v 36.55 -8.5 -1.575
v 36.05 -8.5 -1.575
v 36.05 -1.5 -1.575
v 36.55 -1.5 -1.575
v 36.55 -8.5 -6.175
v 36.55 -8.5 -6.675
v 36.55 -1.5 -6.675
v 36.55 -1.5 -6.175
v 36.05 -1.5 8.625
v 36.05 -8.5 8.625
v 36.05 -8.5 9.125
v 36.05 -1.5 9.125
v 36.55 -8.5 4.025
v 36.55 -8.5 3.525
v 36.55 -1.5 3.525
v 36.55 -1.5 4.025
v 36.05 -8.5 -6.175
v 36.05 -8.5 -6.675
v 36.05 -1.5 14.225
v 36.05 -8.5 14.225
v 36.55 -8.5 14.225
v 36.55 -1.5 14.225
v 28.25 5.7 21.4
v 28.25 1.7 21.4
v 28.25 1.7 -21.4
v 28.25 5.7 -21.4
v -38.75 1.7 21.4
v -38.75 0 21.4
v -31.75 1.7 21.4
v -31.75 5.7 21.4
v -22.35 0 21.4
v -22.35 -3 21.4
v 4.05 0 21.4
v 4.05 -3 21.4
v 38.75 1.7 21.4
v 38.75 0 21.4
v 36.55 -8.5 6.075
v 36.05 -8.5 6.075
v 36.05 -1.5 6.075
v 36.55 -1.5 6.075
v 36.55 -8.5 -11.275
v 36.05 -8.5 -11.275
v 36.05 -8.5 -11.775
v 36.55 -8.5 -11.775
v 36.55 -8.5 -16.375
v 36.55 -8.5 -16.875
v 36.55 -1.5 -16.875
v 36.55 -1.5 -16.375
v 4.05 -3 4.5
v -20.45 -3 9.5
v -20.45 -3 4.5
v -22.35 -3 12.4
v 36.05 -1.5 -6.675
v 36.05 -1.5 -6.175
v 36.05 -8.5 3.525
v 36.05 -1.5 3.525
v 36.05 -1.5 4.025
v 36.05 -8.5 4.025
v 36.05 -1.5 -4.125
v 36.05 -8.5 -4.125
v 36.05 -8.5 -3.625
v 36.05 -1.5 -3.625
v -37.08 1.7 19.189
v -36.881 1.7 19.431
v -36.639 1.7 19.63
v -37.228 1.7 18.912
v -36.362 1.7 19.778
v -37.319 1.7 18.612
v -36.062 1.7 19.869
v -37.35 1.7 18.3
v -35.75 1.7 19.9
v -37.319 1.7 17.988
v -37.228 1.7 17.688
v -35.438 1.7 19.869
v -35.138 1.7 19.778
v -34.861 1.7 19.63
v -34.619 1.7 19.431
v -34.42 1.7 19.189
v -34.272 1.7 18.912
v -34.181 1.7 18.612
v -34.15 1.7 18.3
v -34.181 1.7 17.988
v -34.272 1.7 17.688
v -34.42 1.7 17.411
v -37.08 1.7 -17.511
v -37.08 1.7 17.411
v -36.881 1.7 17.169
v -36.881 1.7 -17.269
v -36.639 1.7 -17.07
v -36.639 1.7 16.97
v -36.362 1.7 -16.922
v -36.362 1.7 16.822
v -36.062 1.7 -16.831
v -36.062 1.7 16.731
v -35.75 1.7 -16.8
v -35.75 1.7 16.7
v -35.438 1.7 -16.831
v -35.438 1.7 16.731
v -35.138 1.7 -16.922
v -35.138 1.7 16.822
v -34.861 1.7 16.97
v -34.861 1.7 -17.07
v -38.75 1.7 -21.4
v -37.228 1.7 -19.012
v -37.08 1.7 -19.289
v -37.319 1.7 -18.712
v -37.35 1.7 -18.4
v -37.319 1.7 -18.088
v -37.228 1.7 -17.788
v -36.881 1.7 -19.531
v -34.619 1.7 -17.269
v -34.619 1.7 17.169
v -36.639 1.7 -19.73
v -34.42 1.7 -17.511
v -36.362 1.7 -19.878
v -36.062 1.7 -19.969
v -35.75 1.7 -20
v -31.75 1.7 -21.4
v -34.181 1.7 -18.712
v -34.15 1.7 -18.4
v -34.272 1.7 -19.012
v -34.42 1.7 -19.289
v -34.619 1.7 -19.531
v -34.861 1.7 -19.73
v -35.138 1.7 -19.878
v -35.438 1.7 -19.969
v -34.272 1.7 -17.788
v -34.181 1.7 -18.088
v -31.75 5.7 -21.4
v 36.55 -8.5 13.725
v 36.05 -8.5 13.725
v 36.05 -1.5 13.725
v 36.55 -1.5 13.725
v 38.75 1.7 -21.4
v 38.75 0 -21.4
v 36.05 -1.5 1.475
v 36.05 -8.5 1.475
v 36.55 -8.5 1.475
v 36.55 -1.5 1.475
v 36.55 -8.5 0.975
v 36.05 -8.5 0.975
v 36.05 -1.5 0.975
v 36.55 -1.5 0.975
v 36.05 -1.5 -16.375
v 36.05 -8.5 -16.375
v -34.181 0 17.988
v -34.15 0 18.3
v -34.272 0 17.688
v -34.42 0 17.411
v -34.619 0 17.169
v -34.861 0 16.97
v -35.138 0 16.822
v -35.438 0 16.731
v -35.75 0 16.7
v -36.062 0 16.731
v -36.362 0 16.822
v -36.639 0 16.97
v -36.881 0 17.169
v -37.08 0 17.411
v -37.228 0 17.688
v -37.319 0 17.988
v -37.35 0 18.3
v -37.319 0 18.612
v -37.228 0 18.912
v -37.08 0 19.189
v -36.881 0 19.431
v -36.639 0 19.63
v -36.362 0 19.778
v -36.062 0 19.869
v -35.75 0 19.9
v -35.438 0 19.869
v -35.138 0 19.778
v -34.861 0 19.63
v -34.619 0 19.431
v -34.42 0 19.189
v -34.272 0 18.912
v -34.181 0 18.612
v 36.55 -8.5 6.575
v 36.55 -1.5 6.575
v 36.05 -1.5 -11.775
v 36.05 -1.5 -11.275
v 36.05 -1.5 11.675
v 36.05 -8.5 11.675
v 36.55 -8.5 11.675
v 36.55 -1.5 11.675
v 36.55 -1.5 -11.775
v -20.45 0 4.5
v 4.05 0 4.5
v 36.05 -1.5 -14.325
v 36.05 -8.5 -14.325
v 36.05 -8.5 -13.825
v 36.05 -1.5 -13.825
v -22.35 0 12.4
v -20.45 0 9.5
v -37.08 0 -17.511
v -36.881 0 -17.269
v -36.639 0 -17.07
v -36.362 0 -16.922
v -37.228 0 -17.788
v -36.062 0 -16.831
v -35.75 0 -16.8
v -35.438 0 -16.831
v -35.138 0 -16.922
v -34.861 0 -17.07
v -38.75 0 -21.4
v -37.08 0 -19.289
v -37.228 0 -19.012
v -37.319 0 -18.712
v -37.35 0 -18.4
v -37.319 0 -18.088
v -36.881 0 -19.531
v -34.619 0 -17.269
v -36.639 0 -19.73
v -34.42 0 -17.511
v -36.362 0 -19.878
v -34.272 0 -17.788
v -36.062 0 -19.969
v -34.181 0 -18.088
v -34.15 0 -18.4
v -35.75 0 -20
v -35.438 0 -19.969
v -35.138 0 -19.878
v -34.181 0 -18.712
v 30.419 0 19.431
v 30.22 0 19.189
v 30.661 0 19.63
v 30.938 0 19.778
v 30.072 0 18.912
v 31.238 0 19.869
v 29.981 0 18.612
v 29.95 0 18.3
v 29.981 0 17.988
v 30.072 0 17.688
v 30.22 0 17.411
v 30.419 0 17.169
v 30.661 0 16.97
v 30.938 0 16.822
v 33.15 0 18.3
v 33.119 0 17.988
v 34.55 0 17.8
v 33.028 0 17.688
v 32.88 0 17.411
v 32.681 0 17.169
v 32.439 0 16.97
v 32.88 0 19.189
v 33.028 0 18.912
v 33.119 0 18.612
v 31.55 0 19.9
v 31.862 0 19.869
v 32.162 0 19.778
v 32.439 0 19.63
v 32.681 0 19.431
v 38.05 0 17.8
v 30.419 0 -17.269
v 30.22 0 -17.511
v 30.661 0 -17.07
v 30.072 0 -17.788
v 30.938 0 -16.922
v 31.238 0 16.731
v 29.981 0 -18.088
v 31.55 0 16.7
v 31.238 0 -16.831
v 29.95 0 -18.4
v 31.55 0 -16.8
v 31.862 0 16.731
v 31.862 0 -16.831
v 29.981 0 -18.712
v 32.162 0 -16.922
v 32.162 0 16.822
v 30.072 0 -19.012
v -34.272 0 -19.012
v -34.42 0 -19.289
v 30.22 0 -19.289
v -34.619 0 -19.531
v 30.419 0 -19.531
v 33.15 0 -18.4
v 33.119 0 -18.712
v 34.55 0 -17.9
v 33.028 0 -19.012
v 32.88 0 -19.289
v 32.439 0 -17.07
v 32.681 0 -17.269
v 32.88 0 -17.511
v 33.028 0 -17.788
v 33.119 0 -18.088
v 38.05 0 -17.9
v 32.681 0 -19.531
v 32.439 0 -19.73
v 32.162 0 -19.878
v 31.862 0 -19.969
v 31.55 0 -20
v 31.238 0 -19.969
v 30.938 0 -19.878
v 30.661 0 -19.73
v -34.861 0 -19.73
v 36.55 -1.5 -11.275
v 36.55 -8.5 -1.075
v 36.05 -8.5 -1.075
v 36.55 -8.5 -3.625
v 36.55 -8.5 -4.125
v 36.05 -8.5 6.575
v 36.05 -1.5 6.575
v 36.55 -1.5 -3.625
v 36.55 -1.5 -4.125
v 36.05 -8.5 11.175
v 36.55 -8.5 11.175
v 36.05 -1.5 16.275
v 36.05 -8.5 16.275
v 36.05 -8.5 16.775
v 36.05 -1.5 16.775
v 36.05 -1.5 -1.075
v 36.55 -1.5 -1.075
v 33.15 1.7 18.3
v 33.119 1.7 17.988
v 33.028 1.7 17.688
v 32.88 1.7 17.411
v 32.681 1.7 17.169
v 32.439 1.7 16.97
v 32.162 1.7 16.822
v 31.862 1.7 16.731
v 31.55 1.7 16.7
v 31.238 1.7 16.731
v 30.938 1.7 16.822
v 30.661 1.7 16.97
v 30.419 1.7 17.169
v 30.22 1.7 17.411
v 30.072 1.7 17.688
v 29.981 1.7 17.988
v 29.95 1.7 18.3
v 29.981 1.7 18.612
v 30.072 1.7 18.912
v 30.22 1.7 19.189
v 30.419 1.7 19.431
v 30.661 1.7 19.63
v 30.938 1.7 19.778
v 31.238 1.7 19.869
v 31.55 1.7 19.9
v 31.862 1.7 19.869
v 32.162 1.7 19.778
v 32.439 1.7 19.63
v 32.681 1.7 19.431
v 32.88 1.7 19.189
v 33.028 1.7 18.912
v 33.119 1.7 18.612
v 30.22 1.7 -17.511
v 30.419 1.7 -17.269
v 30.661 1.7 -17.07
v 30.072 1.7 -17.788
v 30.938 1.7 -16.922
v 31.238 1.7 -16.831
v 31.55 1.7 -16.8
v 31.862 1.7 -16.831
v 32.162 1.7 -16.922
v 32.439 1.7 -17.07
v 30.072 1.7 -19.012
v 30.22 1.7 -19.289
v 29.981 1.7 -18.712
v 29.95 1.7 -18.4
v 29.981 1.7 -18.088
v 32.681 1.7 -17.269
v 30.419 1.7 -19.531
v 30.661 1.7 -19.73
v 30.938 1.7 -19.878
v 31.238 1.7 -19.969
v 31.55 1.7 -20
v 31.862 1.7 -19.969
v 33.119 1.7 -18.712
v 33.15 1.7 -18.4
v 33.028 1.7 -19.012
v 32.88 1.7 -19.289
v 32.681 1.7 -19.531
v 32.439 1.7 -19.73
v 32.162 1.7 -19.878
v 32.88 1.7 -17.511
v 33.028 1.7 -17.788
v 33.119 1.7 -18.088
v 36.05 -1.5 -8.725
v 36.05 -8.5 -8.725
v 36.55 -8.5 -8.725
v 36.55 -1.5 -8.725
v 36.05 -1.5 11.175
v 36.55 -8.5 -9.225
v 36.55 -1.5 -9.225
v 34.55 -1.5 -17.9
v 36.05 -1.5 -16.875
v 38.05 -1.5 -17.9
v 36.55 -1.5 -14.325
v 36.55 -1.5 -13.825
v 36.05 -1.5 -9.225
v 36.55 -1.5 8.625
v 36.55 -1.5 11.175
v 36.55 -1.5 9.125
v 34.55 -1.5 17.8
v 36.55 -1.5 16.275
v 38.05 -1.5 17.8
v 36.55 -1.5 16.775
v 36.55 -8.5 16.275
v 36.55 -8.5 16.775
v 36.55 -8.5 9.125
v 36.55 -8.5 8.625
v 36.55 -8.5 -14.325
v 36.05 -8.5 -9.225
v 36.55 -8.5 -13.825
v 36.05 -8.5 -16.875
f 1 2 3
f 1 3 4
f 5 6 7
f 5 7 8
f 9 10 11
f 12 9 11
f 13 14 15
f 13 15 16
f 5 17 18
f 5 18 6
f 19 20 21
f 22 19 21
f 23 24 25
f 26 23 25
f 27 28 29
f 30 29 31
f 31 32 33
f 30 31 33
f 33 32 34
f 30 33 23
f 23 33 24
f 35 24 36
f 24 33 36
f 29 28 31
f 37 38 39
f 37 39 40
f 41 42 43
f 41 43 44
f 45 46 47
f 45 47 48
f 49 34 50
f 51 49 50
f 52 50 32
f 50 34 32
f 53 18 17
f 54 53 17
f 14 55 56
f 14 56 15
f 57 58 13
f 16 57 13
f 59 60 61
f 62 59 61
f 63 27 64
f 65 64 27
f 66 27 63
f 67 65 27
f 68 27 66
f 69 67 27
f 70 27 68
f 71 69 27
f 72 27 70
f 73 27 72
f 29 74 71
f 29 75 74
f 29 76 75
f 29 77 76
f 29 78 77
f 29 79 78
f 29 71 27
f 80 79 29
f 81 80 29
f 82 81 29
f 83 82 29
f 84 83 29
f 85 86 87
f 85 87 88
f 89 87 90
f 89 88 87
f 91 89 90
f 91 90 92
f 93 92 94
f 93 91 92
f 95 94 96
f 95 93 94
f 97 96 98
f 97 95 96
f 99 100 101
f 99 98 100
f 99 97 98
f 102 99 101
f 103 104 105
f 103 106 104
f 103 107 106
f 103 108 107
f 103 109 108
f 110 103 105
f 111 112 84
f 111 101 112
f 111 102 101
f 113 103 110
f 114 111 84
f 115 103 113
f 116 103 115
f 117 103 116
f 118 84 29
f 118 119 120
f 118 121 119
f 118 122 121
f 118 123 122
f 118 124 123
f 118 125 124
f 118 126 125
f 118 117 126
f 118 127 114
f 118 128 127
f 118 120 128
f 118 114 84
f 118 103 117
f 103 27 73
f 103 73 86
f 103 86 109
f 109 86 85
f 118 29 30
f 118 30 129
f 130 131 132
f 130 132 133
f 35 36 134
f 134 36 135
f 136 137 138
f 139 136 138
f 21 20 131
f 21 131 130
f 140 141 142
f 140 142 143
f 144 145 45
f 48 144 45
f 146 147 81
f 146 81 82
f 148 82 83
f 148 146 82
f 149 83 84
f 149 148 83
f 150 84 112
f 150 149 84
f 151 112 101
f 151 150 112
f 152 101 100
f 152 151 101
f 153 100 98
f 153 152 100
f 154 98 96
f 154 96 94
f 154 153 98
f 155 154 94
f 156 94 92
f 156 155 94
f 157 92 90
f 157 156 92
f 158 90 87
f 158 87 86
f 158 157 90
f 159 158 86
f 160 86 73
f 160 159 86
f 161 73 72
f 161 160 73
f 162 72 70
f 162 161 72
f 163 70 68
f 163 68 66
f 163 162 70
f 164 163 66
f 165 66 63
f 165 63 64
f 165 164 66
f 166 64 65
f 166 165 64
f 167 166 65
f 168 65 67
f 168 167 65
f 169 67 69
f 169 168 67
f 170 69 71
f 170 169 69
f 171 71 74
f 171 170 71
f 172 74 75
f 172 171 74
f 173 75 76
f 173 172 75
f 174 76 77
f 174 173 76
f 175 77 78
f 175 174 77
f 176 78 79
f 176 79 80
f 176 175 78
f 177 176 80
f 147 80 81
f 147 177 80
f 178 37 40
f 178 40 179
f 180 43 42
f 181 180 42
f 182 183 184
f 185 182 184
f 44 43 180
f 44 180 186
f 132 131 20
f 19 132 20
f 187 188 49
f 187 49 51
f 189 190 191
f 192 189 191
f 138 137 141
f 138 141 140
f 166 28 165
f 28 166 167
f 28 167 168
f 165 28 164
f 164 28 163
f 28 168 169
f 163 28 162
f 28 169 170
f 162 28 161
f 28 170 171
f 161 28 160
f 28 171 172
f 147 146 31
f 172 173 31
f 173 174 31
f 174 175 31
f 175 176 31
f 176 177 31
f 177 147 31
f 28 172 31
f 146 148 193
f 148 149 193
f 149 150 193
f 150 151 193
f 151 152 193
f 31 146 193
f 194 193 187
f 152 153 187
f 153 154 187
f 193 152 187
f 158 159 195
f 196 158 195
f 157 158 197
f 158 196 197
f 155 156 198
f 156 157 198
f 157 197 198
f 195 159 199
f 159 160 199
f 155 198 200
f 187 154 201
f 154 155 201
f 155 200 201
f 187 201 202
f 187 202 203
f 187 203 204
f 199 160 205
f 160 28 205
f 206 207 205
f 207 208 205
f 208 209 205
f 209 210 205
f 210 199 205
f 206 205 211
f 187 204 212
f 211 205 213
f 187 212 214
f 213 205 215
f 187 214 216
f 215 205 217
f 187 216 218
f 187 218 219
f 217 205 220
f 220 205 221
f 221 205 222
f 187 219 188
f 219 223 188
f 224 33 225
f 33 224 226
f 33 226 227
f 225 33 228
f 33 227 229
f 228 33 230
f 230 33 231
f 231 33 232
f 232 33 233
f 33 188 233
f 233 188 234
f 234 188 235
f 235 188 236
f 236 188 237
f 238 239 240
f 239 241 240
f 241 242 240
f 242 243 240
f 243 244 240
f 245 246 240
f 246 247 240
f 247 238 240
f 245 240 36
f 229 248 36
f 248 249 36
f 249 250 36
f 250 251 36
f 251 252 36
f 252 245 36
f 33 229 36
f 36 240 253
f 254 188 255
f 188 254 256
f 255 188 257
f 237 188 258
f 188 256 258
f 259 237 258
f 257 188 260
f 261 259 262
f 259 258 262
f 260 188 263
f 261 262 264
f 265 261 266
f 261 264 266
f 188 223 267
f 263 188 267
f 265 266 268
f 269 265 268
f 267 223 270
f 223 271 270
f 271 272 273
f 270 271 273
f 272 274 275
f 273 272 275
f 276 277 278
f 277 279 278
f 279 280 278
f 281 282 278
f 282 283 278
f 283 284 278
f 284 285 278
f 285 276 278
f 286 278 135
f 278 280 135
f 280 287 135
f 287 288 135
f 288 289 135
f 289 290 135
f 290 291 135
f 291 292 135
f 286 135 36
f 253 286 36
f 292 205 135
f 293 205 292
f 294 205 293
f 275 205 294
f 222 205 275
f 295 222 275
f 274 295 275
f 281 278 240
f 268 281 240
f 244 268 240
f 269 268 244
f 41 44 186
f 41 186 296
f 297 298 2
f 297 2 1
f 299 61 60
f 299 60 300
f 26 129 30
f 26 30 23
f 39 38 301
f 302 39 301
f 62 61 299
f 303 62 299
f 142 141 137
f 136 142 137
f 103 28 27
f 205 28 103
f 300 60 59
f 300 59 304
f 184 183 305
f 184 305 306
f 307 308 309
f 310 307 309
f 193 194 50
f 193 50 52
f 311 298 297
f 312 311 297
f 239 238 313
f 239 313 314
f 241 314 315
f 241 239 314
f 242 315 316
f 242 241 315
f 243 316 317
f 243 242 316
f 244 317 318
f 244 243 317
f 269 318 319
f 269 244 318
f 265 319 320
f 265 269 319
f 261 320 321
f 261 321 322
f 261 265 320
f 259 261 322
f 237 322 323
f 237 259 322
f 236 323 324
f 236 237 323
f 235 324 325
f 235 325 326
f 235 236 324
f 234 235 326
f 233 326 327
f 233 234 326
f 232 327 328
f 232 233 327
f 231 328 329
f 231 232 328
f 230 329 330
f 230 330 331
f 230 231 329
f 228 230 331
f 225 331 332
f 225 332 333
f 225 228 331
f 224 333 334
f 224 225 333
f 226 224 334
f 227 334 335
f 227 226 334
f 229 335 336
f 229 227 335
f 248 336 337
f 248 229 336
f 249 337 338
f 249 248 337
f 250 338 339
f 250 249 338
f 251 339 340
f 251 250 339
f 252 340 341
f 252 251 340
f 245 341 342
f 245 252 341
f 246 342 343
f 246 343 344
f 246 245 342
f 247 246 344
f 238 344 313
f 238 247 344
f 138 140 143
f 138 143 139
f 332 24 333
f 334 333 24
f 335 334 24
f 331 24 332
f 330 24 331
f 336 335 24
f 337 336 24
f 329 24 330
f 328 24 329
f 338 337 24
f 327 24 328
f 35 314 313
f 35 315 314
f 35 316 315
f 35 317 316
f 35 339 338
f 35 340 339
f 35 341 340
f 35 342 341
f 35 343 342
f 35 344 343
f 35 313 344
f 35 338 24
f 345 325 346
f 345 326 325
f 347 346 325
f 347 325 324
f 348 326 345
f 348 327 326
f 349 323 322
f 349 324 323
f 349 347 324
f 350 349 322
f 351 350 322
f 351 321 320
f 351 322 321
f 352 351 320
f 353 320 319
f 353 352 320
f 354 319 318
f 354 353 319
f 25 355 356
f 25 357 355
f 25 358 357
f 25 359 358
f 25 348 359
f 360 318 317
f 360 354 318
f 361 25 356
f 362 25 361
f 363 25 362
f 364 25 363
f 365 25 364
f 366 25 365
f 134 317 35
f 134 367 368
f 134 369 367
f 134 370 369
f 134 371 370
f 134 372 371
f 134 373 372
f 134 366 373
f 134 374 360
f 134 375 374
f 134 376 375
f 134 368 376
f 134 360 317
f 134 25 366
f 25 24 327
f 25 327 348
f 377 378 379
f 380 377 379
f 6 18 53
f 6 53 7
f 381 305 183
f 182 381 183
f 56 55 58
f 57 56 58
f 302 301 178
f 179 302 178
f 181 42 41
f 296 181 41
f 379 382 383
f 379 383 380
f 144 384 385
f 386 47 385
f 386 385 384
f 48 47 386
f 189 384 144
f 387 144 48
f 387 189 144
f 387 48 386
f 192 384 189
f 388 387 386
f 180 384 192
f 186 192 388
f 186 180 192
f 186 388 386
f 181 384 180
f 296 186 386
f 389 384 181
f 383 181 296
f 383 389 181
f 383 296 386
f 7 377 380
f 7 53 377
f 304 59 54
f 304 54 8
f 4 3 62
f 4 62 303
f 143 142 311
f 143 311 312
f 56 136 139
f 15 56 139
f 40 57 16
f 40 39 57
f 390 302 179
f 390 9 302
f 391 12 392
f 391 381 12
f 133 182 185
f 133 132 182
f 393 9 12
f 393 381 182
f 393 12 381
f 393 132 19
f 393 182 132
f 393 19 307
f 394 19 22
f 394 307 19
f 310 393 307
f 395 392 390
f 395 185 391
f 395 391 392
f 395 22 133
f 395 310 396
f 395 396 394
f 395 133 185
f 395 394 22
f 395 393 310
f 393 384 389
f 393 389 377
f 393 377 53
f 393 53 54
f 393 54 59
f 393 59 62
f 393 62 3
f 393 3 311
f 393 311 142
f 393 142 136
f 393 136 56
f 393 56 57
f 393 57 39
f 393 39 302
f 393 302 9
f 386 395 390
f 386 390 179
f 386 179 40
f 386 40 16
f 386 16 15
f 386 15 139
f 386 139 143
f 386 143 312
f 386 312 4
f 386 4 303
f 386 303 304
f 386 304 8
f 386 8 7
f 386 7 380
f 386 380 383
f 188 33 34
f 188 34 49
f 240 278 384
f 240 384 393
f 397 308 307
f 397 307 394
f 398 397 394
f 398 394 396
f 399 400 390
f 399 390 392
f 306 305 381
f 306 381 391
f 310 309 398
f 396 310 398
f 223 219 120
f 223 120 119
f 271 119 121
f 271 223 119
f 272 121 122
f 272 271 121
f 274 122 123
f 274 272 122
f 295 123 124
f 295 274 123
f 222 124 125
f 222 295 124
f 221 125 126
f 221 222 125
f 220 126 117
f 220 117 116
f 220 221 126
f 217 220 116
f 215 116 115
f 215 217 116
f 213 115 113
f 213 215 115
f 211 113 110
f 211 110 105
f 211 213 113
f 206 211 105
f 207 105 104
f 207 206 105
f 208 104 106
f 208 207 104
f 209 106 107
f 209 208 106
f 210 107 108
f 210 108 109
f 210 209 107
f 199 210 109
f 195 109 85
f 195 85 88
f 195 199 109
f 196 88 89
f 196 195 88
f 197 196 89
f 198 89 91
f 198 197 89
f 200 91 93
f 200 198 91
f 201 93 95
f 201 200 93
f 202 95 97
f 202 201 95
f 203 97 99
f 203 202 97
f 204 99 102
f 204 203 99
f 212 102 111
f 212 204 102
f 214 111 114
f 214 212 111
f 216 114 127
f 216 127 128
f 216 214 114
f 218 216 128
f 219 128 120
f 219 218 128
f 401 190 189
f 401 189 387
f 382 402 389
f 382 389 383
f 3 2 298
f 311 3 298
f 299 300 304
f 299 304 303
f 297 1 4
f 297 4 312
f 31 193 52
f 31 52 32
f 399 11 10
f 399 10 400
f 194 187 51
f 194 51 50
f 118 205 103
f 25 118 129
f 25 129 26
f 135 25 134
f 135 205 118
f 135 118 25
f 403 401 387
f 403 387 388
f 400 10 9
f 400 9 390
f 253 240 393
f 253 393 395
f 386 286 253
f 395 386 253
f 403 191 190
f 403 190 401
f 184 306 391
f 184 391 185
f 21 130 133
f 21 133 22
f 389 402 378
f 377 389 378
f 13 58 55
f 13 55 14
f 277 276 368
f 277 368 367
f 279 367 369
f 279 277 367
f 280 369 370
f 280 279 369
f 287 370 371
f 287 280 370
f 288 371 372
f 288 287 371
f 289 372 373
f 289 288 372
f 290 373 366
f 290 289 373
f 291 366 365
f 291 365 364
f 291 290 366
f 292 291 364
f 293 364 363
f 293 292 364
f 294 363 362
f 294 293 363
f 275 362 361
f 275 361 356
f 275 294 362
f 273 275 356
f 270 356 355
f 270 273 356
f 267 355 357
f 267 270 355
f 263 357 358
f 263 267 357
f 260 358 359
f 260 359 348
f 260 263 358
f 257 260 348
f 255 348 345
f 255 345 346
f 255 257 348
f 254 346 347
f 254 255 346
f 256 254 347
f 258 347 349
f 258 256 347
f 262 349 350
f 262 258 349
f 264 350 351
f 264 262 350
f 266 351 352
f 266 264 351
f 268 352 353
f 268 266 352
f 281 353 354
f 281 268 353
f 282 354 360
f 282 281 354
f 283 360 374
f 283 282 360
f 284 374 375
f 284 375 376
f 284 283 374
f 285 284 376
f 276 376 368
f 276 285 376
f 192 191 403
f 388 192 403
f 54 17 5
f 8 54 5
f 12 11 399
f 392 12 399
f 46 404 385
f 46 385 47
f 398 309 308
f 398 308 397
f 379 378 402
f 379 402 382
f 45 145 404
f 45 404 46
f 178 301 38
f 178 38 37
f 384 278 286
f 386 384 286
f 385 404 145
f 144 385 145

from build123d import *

# Parameters (mm, degrees)
SZKIC1_W                    = 77.5
SZKIC1_H                    = 42.8
SZKIC1_R                    = 1.6
DODANIE_WYCI_GNI_CIE1_DEPTH = 1.7
SZKIC2_W                    = 60
SZKIC2_H                    = 42.8
DODANIE_WYCI_GNI_CIE2_DEPTH = 4
DODANIE_WYCI_GNI_CIE3_DEPTH = 3
SZKIC4_W                    = 3.5
SZKIC4_H                    = 35.7
DODANIE_WYCI_GNI_CIE4_DEPTH = 8.5
SZKIC5_W                    = 20.589223083
SZKIC5_H                    = 59.264583933
SZKIC5_W_2                  = 0.5
SZKIC5_H_2                  = 0.5
WYTNIJ_WYCI_GNI_CIE1_DEPTH  = 7


with BuildPart() as part:
    # Szkic1 → Dodanie-wyciągnięcie1 (new body)
    with BuildSketch(Plane(origin=(0, 0, 0), x_dir=(1, 0, 0), z_dir=(0, 1, 0))):
        Rectangle(SZKIC1_W, SZKIC1_H)
        with Locations((-35.75, 18.4)):
            Circle(SZKIC1_R, mode=Mode.SUBTRACT)
        with Locations((31.55, 18.4)):
            Circle(SZKIC1_R, mode=Mode.SUBTRACT)
        with Locations((31.55, -18.3)):
            Circle(SZKIC1_R, mode=Mode.SUBTRACT)
        with Locations((-35.75, -18.3)):
            Circle(SZKIC1_R, mode=Mode.SUBTRACT)
    extrude(amount=DODANIE_WYCI_GNI_CIE1_DEPTH)

    # Szkic2 → Dodanie-wyciągnięcie2 (add)
    with BuildSketch(Plane(origin=(0, 1.7, 0), x_dir=(1, 0, 0), z_dir=(0, 1, 0))):
        with Locations((-1.75, 0)):
            Rectangle(SZKIC2_W, SZKIC2_H)
    extrude(amount=DODANIE_WYCI_GNI_CIE2_DEPTH)

    # Szkic3 → Dodanie-wyciągnięcie3 (add)
    with BuildSketch(Plane.XZ):
        Polygon((4.05, 21.4), (4.05, 4.5), (-20.45, 4.5), (-20.45, 9.5), (-22.35, 12.4), (-22.35, 21.4), align=None)
    extrude(amount=DODANIE_WYCI_GNI_CIE3_DEPTH)

    # Szkic4 → Dodanie-wyciągnięcie4 (add)
    with BuildSketch(Plane.XZ):
        with Locations((36.3, -0.05)):
            Rectangle(SZKIC4_W, SZKIC4_H)
    extrude(amount=DODANIE_WYCI_GNI_CIE4_DEPTH)

    # Szkic5 → Wytnij-wyciągnięcie1 (cut)
    with BuildSketch(Plane.XZ.offset(8.5)):
        with Locations((39.347598483, -1.41955971)):
            Rectangle(SZKIC5_W, SZKIC5_H)
        with Locations((36.3, 16.525)):
            Rectangle(SZKIC5_W_2, SZKIC5_H_2, mode=Mode.SUBTRACT)
        with Locations((36.3, 13.975)):
            Rectangle(SZKIC5_W_2, SZKIC5_H_2, mode=Mode.SUBTRACT)
        with Locations((36.3, 11.425)):
            Rectangle(SZKIC5_W_2, SZKIC5_H_2, mode=Mode.SUBTRACT)
        with Locations((36.3, 8.875)):
            Rectangle(SZKIC5_W_2, SZKIC5_H_2, mode=Mode.SUBTRACT)
        with Locations((36.3, 6.325)):
            Rectangle(SZKIC5_W_2, SZKIC5_H_2, mode=Mode.SUBTRACT)
        with Locations((36.3, 3.775)):
            Rectangle(SZKIC5_W_2, SZKIC5_H_2, mode=Mode.SUBTRACT)
        with Locations((36.3, 1.225)):
            Rectangle(SZKIC5_W_2, SZKIC5_H_2, mode=Mode.SUBTRACT)
        with Locations((36.3, -1.325)):
            Rectangle(SZKIC5_W_2, SZKIC5_H_2, mode=Mode.SUBTRACT)
        with Locations((36.3, -3.875)):
            Rectangle(SZKIC5_W_2, SZKIC5_H_2, mode=Mode.SUBTRACT)
        with Locations((36.3, -6.425)):
            Rectangle(SZKIC5_W_2, SZKIC5_H_2, mode=Mode.SUBTRACT)
        with Locations((36.3, -8.975)):
            Rectangle(SZKIC5_W_2, SZKIC5_H_2, mode=Mode.SUBTRACT)
        with Locations((36.3, -11.525)):
            Rectangle(SZKIC5_W_2, SZKIC5_H_2, mode=Mode.SUBTRACT)
        with Locations((36.3, -14.075)):
            Rectangle(SZKIC5_W_2, SZKIC5_H_2, mode=Mode.SUBTRACT)
        with Locations((36.3, -16.625)):
            Rectangle(SZKIC5_W_2, SZKIC5_H_2, mode=Mode.SUBTRACT)
    extrude(amount=-WYTNIJ_WYCI_GNI_CIE1_DEPTH, mode=Mode.SUBTRACT)


solid = part.part
